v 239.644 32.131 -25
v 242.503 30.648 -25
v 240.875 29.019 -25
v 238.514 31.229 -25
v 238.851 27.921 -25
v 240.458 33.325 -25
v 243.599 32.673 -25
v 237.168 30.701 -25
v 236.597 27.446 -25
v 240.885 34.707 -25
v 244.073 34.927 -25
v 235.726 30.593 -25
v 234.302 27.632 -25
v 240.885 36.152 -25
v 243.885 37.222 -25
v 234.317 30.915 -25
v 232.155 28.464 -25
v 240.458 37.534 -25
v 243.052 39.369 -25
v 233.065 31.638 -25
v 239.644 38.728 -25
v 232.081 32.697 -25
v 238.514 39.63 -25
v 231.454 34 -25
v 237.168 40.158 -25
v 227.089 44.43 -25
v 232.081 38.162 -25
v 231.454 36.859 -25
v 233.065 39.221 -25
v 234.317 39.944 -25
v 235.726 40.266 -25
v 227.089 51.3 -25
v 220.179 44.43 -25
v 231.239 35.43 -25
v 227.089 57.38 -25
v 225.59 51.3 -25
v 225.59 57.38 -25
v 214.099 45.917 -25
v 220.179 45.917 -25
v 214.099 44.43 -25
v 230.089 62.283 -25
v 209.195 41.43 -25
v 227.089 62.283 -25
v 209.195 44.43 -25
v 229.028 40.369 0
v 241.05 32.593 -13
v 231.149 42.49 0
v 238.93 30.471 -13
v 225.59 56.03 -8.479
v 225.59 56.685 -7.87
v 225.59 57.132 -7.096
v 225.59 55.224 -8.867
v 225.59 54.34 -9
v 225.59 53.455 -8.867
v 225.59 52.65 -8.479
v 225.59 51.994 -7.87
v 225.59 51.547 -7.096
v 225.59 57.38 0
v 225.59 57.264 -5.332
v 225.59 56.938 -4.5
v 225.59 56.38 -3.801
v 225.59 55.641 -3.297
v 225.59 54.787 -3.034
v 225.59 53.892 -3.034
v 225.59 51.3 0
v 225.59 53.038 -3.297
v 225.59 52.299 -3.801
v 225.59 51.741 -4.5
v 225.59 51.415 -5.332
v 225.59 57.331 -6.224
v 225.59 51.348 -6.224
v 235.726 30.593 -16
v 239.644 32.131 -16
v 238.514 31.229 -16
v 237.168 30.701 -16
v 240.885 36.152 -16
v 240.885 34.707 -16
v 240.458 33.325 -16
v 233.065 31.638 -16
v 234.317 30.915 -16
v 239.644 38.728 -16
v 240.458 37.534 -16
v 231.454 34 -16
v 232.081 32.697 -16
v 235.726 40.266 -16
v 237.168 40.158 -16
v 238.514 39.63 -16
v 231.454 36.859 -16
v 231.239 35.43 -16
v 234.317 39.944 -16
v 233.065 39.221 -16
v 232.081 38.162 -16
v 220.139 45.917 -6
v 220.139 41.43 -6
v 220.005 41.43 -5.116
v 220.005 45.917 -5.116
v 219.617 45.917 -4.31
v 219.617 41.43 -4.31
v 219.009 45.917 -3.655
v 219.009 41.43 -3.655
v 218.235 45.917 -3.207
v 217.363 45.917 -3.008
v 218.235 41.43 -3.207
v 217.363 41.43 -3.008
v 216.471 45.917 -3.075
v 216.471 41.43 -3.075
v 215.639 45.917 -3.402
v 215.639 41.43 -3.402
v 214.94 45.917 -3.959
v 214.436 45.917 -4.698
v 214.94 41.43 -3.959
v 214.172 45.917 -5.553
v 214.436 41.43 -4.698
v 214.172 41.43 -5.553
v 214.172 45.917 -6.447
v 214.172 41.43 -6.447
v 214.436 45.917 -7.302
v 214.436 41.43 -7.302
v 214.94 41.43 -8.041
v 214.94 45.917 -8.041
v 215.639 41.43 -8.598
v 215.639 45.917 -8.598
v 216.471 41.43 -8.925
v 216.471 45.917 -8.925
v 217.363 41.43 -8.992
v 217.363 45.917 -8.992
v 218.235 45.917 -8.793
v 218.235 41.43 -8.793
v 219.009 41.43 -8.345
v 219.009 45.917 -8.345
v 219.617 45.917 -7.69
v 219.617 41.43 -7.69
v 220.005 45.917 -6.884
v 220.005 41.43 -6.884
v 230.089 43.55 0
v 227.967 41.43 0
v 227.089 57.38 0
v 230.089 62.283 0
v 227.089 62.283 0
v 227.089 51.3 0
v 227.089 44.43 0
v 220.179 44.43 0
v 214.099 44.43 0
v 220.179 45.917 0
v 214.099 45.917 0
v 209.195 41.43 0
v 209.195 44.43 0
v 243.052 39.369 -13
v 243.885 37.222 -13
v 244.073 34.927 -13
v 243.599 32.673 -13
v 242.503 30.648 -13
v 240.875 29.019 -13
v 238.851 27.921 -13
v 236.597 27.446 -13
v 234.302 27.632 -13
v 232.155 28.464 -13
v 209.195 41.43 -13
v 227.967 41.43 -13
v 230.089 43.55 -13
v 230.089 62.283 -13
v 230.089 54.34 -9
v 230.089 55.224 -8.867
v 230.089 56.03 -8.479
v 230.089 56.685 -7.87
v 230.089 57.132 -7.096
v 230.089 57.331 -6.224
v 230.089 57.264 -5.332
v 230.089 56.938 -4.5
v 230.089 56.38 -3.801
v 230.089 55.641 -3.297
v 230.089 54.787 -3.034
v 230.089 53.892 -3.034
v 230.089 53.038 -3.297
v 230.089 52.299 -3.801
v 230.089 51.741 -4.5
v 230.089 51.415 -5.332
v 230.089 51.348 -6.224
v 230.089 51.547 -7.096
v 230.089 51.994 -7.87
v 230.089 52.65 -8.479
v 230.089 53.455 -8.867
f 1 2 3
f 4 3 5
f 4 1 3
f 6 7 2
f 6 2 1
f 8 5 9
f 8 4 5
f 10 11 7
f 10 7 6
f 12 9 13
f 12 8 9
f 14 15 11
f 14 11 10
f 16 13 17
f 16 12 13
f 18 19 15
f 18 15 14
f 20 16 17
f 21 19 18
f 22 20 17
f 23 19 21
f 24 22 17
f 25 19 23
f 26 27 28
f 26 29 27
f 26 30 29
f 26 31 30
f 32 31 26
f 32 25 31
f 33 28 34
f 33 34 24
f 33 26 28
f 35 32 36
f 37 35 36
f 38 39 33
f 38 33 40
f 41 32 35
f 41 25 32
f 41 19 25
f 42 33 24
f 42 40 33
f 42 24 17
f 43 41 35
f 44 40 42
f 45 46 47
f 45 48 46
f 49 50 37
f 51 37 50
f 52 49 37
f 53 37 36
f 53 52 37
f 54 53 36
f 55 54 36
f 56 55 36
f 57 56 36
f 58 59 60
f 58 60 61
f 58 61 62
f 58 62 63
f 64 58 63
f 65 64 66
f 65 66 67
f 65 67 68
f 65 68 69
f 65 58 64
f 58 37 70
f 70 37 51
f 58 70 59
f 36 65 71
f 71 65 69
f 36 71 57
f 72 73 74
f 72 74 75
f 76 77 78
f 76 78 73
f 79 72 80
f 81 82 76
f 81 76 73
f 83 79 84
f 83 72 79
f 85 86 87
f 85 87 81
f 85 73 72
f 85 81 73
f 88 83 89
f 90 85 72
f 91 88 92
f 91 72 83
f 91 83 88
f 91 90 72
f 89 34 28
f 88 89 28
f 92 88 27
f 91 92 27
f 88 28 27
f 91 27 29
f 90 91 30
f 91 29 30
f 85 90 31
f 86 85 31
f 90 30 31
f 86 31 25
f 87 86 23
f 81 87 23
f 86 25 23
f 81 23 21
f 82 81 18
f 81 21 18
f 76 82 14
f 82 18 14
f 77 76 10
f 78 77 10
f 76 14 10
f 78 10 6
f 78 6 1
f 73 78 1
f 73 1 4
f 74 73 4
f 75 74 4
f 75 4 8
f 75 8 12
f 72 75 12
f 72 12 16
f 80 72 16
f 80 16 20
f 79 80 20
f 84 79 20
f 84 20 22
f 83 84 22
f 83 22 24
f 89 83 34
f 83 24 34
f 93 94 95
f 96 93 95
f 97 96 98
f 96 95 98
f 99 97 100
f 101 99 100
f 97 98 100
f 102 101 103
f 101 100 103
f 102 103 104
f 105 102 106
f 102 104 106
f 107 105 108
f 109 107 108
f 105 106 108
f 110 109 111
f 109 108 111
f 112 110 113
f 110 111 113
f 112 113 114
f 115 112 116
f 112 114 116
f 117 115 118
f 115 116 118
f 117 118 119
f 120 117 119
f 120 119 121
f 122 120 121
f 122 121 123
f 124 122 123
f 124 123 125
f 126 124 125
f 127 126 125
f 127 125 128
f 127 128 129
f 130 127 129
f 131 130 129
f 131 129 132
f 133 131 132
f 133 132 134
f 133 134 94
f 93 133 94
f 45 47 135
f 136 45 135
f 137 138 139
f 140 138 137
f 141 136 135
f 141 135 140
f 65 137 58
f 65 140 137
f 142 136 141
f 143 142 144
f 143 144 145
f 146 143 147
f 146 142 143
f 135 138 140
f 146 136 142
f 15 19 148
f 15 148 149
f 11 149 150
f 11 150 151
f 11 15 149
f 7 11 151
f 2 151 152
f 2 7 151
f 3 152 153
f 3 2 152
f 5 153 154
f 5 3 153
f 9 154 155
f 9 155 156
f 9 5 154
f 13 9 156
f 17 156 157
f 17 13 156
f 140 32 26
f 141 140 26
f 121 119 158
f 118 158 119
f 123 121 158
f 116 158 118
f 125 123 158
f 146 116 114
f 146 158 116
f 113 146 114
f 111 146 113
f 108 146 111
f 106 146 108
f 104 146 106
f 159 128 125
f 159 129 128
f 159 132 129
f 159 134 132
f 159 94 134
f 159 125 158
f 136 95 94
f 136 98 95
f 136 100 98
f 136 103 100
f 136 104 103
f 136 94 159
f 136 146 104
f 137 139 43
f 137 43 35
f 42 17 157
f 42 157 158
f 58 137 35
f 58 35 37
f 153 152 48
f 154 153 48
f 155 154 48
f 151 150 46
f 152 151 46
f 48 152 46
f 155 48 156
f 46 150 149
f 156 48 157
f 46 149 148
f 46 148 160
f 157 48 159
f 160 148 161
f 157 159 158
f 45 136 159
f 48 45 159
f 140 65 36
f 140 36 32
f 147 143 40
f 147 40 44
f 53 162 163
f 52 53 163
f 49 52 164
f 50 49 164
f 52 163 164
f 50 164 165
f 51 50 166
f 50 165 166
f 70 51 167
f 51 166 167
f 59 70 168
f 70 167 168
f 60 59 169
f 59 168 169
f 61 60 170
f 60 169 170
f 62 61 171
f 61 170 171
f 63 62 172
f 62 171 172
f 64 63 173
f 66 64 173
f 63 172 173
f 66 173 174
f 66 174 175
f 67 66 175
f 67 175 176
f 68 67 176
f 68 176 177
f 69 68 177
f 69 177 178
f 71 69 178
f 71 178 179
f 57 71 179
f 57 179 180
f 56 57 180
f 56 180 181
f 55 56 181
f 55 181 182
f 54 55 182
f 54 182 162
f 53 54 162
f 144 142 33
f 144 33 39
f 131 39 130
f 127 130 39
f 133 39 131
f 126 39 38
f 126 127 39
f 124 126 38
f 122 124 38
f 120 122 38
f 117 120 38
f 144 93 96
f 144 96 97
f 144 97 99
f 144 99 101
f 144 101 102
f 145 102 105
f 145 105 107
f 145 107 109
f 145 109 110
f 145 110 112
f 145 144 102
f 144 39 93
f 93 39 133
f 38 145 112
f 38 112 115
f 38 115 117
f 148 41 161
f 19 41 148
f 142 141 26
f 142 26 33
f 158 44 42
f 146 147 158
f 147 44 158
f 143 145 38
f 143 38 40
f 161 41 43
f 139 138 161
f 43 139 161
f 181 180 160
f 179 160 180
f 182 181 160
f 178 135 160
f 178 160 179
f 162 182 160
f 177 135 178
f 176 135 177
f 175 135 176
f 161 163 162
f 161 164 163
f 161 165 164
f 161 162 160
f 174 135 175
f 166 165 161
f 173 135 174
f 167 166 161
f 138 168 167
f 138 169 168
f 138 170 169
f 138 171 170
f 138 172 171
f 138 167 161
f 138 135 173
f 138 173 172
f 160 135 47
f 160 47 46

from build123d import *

# Parameters (mm, degrees)
BOSS_EXTRUDE1_DEPTH = 25
SKETCH2_R           = 3
CUT_EXTRUDE1_DEPTH  = 15
SKETCH3_R           = 3
CUT_EXTRUDE2_DEPTH  = 15
BOSS_EXTRUDE2_DEPTH = 12
BOSS_EXTRUDE4_DEPTH = 1.5
SKETCH6_R           = 4.85
CUT_EXTRUDE3_DEPTH  = 9


with BuildPart() as part:
    # Sketch1 → Boss-Extrude1 (new body)
    with BuildSketch(Plane.XY):
        Polygon((227.088719843, 62.282971172), (227.088719843, 57.379571172), (225.590119843, 57.379571172), (225.590119843, 51.299571172), (227.088719843, 51.299571172), (227.088719843, 44.429550862), (220.178702595, 44.429550862), (220.178702595, 45.917195068), (214.098687419, 45.917195068), (214.098687419, 44.429550862), (209.19527518, 44.429550862), (209.19527518, 41.429550862), (230.088719843, 41.429550862), (230.088719843, 62.282971172), align=None)
    extrude(amount=-BOSS_EXTRUDE1_DEPTH)

    # Sketch2 → Cut-Extrude1 (cut)
    with BuildSketch(Plane(origin=(230.088719843, 0, 0), x_dir=(0, 0, -1), z_dir=(1, 0, 0))):
        with Locations((6, 54.339571172)):
            Circle(SKETCH2_R)
    extrude(amount=-CUT_EXTRUDE1_DEPTH, mode=Mode.SUBTRACT)

    # Sketch3 → Cut-Extrude2 (cut)
    with BuildSketch(Plane.XZ.offset(-41.429550862)):
        with Locations((217.138695007, -6)):
            Circle(SKETCH3_R)
    extrude(amount=-CUT_EXTRUDE2_DEPTH, mode=Mode.SUBTRACT)

    # Sketch4 → Boss-Extrude2 (add)
    with BuildSketch(Plane(origin=(0, 0, -25), x_dir=(-1, 0, 0), z_dir=(0, 0, -1))):
        with BuildLine():
            Line((-230.088719843, 62.282971172), (-243.051733392, 39.368642422))
            ThreePointArc((-243.051733392, 39.368642422), (-241.747687926, 29.774811236), (-232.154834185, 28.463594817))
            Line((-232.154834185, 28.463594817), (-209.19527518, 41.429550862))
            Line((-209.19527518, 41.429550862), (-230.088719843, 41.429550862))
            Line((-230.088719843, 41.429550862), (-230.088719843, 62.282971172))
        make_face()
    extrude(amount=-BOSS_EXTRUDE2_DEPTH)

    # Sketch5 → Boss-Extrude4 (add, symmetric)
    with BuildSketch(Plane(origin=(135.717402312, 135.766641949, 0), x_dir=(0.707235019, -0.70697852, 0), z_dir=(-0.70697852, -0.707235019, 0))):
        Polygon((133.436997596, -13), (147.436997596, -13), (133.436997596, 0), (129.194356979, 0), (129.194356979, -13), align=None)
    extrude(amount=BOSS_EXTRUDE4_DEPTH, both=True)

    # Sketch6 → Cut-Extrude3 (cut)
    with BuildSketch(Plane(origin=(0, 0, -25), x_dir=(-1, 0, 0), z_dir=(0, 0, -1))):
        with Locations((-236.088719843, 35.429550862)):
            Circle(SKETCH6_R)
    extrude(amount=-CUT_EXTRUDE3_DEPTH, mode=Mode.SUBTRACT)


solid = part.part
